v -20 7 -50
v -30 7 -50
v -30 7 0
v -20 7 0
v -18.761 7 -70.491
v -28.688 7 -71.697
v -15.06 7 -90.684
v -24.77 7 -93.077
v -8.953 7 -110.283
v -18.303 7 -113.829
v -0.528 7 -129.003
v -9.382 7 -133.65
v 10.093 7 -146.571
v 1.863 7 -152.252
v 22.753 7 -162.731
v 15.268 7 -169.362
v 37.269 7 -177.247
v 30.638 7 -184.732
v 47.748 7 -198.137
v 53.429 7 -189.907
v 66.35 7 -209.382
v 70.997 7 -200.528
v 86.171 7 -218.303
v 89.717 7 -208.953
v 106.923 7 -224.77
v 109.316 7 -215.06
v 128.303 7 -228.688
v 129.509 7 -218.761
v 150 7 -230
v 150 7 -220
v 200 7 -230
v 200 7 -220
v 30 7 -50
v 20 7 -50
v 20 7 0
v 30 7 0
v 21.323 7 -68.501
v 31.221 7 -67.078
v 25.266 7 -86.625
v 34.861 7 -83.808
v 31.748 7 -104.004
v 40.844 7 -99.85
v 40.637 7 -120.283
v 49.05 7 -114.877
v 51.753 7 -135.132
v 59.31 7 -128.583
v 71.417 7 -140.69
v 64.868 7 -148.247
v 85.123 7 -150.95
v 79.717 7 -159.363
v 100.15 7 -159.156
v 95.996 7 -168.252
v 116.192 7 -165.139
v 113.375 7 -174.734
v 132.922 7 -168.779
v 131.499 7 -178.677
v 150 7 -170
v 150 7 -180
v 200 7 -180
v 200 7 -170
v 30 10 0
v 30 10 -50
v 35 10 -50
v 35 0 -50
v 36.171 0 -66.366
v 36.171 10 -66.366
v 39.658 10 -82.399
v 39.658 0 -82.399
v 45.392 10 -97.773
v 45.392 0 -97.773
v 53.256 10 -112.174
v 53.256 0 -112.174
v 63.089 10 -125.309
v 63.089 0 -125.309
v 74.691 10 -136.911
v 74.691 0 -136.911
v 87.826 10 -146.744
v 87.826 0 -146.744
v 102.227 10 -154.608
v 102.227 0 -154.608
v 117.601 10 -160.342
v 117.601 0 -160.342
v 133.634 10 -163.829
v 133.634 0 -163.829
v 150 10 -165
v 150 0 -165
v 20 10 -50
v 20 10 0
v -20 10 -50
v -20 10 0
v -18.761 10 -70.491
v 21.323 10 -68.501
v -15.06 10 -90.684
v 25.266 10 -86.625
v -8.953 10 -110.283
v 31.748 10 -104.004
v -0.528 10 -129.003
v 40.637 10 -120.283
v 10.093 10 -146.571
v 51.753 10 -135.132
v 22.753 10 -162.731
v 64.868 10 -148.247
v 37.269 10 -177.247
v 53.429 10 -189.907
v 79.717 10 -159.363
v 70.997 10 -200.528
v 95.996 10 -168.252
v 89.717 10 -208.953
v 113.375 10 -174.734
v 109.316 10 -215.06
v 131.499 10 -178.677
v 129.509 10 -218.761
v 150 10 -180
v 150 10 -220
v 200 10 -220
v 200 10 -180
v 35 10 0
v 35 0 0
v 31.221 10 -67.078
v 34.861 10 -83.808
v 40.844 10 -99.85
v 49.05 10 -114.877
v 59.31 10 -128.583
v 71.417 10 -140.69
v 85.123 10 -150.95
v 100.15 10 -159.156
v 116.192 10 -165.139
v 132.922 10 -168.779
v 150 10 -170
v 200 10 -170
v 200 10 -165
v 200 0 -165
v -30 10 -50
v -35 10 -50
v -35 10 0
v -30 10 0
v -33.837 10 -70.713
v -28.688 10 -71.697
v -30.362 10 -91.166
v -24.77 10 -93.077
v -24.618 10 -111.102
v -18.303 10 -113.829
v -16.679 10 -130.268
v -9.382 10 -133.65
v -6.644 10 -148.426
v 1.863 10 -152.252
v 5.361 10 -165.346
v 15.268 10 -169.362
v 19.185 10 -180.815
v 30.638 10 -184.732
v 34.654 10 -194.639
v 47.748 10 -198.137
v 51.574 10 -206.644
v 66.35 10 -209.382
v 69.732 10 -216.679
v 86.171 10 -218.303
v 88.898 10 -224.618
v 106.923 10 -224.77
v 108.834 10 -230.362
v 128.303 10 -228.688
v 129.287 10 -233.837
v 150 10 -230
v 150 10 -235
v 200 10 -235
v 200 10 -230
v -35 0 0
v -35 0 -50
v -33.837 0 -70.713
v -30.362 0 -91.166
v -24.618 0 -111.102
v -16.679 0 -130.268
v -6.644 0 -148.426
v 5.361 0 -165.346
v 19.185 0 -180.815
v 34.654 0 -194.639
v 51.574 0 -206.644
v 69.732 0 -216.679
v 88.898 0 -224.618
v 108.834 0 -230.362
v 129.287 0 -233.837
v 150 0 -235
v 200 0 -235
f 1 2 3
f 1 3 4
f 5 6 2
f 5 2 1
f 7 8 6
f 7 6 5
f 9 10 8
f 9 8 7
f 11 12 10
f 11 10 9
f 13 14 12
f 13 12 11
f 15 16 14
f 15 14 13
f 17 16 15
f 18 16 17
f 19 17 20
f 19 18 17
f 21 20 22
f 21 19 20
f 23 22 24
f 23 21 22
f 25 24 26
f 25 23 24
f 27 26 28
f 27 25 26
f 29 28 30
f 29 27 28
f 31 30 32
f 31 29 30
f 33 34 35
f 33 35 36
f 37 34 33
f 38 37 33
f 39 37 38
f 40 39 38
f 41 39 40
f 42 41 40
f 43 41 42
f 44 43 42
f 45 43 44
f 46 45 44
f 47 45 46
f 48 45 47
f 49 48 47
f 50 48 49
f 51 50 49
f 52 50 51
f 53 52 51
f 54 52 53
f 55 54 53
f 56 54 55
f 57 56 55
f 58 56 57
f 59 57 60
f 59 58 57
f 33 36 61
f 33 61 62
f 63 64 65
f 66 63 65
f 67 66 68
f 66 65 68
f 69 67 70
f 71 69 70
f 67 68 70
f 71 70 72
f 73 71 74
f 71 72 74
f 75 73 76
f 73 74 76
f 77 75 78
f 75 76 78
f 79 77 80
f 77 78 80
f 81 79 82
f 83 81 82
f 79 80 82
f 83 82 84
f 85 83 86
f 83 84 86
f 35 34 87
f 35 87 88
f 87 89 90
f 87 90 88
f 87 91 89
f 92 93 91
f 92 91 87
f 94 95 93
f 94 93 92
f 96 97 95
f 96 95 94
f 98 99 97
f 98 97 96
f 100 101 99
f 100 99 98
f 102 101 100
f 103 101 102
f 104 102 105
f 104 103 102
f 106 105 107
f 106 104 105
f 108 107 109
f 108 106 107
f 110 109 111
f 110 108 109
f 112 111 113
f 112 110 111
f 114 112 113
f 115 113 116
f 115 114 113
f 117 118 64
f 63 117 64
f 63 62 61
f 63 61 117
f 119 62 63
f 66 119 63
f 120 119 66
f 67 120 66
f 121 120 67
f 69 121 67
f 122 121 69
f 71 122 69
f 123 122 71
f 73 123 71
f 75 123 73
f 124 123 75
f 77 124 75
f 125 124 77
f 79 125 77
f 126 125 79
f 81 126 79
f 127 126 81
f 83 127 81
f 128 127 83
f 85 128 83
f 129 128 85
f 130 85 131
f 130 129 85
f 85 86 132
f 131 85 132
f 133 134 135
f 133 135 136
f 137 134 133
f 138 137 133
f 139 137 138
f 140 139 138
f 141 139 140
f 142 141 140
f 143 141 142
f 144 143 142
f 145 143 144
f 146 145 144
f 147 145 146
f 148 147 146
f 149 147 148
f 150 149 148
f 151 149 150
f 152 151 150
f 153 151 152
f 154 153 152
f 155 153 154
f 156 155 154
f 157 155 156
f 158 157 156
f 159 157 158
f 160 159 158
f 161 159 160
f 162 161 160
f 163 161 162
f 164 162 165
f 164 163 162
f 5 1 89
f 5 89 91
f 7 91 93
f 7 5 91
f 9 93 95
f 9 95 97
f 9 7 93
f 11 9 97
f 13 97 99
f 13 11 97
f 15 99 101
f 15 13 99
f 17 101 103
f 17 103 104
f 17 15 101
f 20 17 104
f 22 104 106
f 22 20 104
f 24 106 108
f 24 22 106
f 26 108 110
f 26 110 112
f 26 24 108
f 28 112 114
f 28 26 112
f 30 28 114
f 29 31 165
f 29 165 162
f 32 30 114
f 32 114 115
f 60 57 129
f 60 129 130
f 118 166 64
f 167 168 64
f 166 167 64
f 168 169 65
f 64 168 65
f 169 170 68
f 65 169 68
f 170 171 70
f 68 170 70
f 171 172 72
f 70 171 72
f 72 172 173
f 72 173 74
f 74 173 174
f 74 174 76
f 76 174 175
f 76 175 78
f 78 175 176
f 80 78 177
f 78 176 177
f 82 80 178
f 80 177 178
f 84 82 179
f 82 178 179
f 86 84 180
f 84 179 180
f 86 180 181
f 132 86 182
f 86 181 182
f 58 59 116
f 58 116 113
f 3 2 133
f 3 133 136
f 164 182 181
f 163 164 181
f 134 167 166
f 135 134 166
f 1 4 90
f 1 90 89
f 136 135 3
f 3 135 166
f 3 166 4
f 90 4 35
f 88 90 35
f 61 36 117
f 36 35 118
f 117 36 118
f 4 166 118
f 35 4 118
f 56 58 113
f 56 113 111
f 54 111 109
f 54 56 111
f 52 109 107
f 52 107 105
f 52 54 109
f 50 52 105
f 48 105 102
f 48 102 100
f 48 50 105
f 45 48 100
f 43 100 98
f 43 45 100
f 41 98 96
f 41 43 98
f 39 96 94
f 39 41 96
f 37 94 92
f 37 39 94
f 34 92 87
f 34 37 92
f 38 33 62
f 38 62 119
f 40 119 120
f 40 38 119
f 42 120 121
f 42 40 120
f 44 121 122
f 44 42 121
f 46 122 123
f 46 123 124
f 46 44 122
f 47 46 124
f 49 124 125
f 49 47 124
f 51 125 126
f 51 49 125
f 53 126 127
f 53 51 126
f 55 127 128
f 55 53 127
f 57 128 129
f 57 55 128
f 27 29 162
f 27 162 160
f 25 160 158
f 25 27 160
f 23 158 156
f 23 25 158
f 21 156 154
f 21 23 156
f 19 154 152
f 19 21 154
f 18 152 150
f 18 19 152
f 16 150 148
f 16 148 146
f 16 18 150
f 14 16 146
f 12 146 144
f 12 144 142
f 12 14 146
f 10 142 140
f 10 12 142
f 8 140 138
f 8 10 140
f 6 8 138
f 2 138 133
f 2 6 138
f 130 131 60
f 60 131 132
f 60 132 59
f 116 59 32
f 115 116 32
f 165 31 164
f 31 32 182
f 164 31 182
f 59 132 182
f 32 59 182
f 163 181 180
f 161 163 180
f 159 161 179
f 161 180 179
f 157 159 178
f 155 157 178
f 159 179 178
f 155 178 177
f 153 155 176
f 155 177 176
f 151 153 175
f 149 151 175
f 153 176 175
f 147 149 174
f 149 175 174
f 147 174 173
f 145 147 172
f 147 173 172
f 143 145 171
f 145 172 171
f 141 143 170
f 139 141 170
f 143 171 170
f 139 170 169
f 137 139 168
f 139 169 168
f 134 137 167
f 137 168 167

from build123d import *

# Parameters (mm, degrees)
BOSS_EXTRUDE1_DEPTH = 10
CUT_SWEEP1_START    = 7
CUT_SWEEP1_DEPTH    = 3


# Read off the part's stored shape, not the designer's step: Cut-Sweep1
with BuildPart() as part:
    # Sketch1 → Boss-Extrude1 (new body)
    with BuildSketch(Plane(origin=(0, 0, 0), x_dir=(1, 0, 0), z_dir=(0, 1, 0))):
        with BuildLine():
            Line((-35, 0), (35, 0))
            Line((35, 0), (35, 50))
            ThreePointArc((35, 50), (68.682720164, 131.317279836), (150, 165))
            Line((150, 165), (200, 165))
            Line((200, 165), (200, 235))
            Line((200, 235), (150, 235))
            ThreePointArc((150, 235), (19.18524548, 180.81475452), (-35, 50))
            Line((-35, 50), (-35, 0))
        make_face()
    extrude(amount=BOSS_EXTRUDE1_DEPTH)

    # Cut-Sweep1 outline → Cut-Sweep1 (cut)
    with BuildSketch(Plane(origin=(0, 0, 0), x_dir=(1, 0, 0), z_dir=(0, 1, 0)).offset(CUT_SWEEP1_START)):
        with BuildLine():
            Line((-30, 50), (-30, 0))
            Line((-30, 0), (-20, 0))
            Line((-20, 0), (-20, 50))
            ThreePointArc((-20, 50), (29.791847198, 170.208152802), (150, 220))
            Line((150, 220), (200, 220))
            Line((200, 220), (200, 230))
            Line((200, 230), (150, 230))
            ThreePointArc((150, 230), (22.720779386, 177.279220614), (-30, 50))
        make_face()
        with BuildLine():
            Line((20, 50), (20, 0))
            Line((20, 0), (30, 0))
            Line((30, 0), (30, 50))
            ThreePointArc((30, 50), (65.147186258, 134.852813742), (150, 170))
            Line((150, 170), (200, 170))
            Line((200, 170), (200, 180))
            Line((200, 180), (150, 180))
            ThreePointArc((150, 180), (58.076118446, 141.923881554), (20, 50))
        make_face()
    extrude(amount=CUT_SWEEP1_DEPTH, mode=Mode.SUBTRACT)


solid = part.part
